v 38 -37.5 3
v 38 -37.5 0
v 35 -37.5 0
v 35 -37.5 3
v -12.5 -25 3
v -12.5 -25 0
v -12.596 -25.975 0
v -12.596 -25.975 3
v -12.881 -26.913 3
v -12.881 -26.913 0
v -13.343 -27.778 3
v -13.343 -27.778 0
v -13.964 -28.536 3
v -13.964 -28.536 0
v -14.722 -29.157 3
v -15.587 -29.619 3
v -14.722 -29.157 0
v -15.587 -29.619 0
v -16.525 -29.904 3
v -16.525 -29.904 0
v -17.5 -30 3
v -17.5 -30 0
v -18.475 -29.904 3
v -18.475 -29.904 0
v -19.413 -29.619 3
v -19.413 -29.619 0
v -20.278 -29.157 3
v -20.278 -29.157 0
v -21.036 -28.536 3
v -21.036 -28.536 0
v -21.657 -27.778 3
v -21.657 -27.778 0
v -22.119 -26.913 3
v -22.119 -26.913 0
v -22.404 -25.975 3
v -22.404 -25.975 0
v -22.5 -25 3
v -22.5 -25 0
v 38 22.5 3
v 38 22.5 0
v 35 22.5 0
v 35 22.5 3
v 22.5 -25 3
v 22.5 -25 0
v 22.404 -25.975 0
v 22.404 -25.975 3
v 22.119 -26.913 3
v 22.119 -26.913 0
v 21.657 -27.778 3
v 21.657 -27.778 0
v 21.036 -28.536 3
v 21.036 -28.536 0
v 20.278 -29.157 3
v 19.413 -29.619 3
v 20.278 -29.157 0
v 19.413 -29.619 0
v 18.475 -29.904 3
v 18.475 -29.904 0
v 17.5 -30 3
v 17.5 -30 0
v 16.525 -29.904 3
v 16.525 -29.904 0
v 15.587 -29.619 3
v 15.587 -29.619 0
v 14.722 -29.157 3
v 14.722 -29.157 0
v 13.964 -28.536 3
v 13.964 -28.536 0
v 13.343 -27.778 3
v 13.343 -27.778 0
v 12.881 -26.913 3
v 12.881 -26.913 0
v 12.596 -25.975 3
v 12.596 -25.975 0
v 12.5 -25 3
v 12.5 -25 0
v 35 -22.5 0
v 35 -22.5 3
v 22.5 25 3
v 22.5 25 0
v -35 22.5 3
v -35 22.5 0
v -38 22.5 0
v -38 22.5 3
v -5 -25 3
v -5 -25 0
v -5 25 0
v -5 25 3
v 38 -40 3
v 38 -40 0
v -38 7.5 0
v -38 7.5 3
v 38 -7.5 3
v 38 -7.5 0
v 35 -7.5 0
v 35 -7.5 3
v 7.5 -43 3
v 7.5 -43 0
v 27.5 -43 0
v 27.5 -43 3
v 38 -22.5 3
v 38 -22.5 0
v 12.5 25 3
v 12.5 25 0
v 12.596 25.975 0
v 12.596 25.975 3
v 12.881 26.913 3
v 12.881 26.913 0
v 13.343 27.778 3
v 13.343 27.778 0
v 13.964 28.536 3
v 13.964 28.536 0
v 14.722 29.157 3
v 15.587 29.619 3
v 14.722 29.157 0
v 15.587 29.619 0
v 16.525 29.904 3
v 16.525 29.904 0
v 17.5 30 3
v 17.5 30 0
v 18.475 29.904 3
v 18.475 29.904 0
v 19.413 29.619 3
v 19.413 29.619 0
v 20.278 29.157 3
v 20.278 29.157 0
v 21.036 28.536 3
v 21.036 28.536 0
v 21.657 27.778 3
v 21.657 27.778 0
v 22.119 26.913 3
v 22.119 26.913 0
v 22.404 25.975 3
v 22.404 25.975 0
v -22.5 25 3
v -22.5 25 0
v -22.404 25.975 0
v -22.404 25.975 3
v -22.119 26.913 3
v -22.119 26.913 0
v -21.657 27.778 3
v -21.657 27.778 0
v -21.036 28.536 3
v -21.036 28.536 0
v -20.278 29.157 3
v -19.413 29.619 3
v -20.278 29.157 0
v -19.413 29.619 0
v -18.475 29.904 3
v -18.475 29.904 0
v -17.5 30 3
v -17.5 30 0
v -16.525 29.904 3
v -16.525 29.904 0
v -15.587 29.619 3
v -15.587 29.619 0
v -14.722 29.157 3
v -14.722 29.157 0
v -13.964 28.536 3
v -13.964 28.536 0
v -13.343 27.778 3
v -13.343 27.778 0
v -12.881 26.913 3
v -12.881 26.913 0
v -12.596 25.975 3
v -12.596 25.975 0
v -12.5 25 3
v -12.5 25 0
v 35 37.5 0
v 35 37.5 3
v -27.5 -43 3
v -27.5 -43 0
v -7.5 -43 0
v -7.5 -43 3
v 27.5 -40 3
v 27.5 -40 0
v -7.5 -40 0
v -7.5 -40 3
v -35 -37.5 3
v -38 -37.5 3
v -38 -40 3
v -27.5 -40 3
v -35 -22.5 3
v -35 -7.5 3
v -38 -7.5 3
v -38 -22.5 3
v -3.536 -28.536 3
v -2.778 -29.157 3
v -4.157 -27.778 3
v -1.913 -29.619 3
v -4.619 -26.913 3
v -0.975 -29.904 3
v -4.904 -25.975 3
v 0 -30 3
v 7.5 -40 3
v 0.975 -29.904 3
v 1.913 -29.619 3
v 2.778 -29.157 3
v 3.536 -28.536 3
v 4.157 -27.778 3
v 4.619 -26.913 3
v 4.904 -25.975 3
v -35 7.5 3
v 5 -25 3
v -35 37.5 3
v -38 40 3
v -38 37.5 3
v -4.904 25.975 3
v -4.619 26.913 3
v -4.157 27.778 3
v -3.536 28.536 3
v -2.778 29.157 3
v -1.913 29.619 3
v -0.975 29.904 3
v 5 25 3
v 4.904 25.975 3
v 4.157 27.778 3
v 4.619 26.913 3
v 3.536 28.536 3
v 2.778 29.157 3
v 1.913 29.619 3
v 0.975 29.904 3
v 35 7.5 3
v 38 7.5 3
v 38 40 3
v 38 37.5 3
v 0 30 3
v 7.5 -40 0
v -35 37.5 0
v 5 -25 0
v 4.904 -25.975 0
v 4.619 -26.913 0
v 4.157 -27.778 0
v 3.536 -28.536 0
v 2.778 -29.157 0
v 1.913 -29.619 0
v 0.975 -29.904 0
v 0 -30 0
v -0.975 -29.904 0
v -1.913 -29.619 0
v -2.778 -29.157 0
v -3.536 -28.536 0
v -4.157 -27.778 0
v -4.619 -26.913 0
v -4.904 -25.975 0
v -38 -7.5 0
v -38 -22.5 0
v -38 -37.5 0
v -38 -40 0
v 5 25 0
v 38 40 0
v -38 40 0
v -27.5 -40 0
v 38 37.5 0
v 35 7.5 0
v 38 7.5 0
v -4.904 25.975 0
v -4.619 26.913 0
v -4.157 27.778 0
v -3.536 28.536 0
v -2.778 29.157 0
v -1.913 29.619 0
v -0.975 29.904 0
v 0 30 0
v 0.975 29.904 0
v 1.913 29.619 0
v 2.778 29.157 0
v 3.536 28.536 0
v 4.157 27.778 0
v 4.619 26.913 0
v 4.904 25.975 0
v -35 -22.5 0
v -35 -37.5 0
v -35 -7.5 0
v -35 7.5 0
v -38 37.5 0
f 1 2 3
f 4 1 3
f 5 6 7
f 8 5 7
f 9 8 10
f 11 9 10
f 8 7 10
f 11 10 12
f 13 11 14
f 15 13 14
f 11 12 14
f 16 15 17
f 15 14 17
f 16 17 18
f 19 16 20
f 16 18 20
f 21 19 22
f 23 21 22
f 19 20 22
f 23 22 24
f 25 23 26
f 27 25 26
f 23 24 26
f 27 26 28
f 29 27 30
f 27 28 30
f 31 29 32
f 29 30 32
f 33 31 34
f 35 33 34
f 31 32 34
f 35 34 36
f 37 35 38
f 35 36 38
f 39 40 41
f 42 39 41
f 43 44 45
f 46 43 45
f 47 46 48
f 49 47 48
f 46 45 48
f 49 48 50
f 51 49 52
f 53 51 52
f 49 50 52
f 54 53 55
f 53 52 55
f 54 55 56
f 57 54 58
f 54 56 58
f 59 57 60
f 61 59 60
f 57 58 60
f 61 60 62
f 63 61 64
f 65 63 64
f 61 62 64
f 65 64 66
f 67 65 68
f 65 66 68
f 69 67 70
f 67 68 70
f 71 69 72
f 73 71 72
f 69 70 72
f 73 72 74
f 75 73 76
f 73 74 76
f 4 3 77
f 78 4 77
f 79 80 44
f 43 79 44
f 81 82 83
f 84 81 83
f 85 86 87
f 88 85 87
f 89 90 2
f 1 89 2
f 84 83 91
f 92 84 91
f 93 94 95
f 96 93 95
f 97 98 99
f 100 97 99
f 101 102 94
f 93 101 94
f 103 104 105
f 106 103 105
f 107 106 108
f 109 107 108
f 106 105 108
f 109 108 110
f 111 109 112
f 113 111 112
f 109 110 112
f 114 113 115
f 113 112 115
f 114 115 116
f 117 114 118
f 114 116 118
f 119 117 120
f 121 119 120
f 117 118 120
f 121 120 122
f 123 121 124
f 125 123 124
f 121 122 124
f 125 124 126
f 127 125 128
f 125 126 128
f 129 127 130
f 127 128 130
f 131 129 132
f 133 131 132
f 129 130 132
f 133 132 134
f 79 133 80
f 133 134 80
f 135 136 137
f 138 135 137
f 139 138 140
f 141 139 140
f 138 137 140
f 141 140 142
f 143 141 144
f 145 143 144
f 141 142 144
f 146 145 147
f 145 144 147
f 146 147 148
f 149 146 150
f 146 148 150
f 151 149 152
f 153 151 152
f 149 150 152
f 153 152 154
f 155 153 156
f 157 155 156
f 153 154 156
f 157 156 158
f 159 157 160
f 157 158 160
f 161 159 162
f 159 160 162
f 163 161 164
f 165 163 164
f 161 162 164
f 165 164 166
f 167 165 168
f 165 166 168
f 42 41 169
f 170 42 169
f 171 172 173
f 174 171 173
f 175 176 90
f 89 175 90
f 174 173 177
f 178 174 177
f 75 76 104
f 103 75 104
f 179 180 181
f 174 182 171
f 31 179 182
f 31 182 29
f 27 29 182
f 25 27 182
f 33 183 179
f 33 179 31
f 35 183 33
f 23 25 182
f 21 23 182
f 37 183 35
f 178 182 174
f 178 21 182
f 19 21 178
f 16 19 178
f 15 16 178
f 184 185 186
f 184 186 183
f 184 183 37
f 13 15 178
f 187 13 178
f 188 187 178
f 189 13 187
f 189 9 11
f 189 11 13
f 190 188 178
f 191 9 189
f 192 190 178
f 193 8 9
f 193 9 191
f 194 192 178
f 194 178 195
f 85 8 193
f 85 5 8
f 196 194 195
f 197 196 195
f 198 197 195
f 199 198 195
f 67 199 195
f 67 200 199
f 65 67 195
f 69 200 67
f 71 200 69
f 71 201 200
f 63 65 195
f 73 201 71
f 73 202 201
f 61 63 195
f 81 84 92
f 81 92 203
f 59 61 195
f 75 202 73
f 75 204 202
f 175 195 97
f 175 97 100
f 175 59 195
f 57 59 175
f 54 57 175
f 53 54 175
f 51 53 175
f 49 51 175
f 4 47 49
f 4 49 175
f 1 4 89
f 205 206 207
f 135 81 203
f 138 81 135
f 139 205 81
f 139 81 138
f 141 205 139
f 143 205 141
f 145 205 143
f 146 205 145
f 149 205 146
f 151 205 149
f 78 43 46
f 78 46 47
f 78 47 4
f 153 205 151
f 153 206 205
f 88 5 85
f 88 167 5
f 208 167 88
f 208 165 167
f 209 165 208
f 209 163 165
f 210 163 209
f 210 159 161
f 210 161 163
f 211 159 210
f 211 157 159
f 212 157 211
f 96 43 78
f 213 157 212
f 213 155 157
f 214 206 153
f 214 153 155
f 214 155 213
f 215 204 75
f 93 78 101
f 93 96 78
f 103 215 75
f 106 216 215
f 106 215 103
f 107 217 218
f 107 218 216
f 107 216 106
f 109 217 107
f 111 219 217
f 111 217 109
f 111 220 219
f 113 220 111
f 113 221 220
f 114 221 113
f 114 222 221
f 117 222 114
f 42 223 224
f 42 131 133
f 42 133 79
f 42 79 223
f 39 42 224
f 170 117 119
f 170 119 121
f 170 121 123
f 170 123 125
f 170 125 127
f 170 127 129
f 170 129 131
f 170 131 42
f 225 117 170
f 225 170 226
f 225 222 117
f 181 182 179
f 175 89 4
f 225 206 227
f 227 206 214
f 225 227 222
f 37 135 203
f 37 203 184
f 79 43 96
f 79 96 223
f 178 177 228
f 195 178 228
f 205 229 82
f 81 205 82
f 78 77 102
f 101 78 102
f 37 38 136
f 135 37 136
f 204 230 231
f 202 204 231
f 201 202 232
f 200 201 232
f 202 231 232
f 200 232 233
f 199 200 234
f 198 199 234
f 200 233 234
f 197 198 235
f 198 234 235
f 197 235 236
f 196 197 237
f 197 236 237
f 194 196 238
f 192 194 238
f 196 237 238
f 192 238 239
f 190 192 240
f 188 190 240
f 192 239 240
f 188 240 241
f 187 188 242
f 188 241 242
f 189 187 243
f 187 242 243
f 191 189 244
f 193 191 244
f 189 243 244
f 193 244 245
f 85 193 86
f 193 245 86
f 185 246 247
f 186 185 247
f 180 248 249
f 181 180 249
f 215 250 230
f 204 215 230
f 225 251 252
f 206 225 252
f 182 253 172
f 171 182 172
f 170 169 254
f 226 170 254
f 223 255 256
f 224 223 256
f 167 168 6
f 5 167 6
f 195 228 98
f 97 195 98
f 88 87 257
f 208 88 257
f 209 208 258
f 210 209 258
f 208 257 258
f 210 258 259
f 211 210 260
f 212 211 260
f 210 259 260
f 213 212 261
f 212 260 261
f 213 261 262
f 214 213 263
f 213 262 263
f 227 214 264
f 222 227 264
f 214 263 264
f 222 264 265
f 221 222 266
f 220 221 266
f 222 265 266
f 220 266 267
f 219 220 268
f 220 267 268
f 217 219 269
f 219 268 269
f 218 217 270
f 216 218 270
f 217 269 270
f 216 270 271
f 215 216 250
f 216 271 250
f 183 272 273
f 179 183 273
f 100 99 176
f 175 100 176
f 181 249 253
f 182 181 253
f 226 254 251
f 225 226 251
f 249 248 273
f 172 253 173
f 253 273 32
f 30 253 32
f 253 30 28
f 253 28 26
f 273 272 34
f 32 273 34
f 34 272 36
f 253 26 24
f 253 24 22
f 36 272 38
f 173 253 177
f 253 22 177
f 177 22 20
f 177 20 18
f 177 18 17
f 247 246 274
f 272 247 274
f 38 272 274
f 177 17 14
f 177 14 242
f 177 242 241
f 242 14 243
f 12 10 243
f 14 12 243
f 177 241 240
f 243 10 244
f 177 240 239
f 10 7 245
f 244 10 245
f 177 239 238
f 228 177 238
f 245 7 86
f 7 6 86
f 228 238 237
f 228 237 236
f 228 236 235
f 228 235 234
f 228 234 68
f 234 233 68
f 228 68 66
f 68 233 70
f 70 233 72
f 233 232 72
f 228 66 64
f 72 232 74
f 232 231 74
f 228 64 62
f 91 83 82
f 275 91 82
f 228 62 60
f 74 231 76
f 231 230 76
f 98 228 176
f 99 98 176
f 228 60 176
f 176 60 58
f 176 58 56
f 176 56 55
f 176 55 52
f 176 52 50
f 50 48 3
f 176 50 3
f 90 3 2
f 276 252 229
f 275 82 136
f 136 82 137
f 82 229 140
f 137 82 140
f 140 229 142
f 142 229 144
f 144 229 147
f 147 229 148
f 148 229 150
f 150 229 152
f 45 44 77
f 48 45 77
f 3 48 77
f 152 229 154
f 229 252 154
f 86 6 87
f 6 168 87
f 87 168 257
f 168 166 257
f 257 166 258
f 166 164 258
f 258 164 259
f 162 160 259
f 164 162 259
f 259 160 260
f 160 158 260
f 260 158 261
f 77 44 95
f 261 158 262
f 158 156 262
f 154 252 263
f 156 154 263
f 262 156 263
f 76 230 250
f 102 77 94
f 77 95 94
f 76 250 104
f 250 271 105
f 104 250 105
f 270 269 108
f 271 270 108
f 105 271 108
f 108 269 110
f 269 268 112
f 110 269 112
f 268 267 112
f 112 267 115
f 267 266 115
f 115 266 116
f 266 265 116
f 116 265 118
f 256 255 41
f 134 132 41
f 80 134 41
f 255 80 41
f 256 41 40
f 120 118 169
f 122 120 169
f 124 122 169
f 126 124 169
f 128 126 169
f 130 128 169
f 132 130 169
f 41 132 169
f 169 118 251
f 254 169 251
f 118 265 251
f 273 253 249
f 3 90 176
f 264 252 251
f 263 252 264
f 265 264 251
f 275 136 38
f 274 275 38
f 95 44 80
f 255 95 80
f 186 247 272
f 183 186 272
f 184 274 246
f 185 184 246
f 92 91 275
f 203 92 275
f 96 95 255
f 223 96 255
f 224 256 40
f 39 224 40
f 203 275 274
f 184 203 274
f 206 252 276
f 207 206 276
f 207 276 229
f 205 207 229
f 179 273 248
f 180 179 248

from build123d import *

# Parameters (mm, degrees)
BOSS_EXTRUDE1_DEPTH = 3


with BuildPart() as part:
    # Sketch1 → Boss-Extrude1 (new body)
    with BuildSketch(Plane.XY):
        Polygon((-38, 40), (-38, 37.5), (-35, 37.5), (-35, 22.5), (-38, 22.5), (-38, 7.5), (-35, 7.5), (-35, -7.5), (-38, -7.5), (-38, -22.5), (-35, -22.5), (-35, -37.5), (-38, -37.5), (-38, -40), (-27.5, -40), (-27.5, -43), (-7.5, -43), (-7.5, -40), (7.5, -40), (7.5, -43), (27.5, -43), (27.5, -40), (38, -40), (38, -37.5), (35, -37.5), (35, -22.5), (38, -22.5), (38, -7.5), (35, -7.5), (35, 7.5), (38, 7.5), (38, 22.5), (35, 22.5), (35, 37.5), (38, 37.5), (38, 40), align=None)
        with BuildLine():
            Line((-12.5, 25), (-12.5, -25))
            ThreePointArc((-12.5, -25), (-17.5, -30), (-22.5, -25))
            Line((-22.5, -25), (-22.5, 25))
            ThreePointArc((-22.5, 25), (-17.5, 30), (-12.5, 25))
        make_face(mode=Mode.SUBTRACT)
        with BuildLine():
            ThreePointArc((5, -25), (0, -30), (-5, -25))
            Line((-5, -25), (-5, 25))
            ThreePointArc((-5, 25), (0, 30), (5, 25))
            Line((5, 25), (5, -25))
        make_face(mode=Mode.SUBTRACT)
        with BuildLine():
            ThreePointArc((22.5, -25), (17.5, -30), (12.5, -25))
            Line((12.5, -25), (12.5, 25))
            ThreePointArc((12.5, 25), (17.5, 30), (22.5, 25))
            Line((22.5, 25), (22.5, -25))
        make_face(mode=Mode.SUBTRACT)
    extrude(amount=BOSS_EXTRUDE1_DEPTH)


solid = part.part
